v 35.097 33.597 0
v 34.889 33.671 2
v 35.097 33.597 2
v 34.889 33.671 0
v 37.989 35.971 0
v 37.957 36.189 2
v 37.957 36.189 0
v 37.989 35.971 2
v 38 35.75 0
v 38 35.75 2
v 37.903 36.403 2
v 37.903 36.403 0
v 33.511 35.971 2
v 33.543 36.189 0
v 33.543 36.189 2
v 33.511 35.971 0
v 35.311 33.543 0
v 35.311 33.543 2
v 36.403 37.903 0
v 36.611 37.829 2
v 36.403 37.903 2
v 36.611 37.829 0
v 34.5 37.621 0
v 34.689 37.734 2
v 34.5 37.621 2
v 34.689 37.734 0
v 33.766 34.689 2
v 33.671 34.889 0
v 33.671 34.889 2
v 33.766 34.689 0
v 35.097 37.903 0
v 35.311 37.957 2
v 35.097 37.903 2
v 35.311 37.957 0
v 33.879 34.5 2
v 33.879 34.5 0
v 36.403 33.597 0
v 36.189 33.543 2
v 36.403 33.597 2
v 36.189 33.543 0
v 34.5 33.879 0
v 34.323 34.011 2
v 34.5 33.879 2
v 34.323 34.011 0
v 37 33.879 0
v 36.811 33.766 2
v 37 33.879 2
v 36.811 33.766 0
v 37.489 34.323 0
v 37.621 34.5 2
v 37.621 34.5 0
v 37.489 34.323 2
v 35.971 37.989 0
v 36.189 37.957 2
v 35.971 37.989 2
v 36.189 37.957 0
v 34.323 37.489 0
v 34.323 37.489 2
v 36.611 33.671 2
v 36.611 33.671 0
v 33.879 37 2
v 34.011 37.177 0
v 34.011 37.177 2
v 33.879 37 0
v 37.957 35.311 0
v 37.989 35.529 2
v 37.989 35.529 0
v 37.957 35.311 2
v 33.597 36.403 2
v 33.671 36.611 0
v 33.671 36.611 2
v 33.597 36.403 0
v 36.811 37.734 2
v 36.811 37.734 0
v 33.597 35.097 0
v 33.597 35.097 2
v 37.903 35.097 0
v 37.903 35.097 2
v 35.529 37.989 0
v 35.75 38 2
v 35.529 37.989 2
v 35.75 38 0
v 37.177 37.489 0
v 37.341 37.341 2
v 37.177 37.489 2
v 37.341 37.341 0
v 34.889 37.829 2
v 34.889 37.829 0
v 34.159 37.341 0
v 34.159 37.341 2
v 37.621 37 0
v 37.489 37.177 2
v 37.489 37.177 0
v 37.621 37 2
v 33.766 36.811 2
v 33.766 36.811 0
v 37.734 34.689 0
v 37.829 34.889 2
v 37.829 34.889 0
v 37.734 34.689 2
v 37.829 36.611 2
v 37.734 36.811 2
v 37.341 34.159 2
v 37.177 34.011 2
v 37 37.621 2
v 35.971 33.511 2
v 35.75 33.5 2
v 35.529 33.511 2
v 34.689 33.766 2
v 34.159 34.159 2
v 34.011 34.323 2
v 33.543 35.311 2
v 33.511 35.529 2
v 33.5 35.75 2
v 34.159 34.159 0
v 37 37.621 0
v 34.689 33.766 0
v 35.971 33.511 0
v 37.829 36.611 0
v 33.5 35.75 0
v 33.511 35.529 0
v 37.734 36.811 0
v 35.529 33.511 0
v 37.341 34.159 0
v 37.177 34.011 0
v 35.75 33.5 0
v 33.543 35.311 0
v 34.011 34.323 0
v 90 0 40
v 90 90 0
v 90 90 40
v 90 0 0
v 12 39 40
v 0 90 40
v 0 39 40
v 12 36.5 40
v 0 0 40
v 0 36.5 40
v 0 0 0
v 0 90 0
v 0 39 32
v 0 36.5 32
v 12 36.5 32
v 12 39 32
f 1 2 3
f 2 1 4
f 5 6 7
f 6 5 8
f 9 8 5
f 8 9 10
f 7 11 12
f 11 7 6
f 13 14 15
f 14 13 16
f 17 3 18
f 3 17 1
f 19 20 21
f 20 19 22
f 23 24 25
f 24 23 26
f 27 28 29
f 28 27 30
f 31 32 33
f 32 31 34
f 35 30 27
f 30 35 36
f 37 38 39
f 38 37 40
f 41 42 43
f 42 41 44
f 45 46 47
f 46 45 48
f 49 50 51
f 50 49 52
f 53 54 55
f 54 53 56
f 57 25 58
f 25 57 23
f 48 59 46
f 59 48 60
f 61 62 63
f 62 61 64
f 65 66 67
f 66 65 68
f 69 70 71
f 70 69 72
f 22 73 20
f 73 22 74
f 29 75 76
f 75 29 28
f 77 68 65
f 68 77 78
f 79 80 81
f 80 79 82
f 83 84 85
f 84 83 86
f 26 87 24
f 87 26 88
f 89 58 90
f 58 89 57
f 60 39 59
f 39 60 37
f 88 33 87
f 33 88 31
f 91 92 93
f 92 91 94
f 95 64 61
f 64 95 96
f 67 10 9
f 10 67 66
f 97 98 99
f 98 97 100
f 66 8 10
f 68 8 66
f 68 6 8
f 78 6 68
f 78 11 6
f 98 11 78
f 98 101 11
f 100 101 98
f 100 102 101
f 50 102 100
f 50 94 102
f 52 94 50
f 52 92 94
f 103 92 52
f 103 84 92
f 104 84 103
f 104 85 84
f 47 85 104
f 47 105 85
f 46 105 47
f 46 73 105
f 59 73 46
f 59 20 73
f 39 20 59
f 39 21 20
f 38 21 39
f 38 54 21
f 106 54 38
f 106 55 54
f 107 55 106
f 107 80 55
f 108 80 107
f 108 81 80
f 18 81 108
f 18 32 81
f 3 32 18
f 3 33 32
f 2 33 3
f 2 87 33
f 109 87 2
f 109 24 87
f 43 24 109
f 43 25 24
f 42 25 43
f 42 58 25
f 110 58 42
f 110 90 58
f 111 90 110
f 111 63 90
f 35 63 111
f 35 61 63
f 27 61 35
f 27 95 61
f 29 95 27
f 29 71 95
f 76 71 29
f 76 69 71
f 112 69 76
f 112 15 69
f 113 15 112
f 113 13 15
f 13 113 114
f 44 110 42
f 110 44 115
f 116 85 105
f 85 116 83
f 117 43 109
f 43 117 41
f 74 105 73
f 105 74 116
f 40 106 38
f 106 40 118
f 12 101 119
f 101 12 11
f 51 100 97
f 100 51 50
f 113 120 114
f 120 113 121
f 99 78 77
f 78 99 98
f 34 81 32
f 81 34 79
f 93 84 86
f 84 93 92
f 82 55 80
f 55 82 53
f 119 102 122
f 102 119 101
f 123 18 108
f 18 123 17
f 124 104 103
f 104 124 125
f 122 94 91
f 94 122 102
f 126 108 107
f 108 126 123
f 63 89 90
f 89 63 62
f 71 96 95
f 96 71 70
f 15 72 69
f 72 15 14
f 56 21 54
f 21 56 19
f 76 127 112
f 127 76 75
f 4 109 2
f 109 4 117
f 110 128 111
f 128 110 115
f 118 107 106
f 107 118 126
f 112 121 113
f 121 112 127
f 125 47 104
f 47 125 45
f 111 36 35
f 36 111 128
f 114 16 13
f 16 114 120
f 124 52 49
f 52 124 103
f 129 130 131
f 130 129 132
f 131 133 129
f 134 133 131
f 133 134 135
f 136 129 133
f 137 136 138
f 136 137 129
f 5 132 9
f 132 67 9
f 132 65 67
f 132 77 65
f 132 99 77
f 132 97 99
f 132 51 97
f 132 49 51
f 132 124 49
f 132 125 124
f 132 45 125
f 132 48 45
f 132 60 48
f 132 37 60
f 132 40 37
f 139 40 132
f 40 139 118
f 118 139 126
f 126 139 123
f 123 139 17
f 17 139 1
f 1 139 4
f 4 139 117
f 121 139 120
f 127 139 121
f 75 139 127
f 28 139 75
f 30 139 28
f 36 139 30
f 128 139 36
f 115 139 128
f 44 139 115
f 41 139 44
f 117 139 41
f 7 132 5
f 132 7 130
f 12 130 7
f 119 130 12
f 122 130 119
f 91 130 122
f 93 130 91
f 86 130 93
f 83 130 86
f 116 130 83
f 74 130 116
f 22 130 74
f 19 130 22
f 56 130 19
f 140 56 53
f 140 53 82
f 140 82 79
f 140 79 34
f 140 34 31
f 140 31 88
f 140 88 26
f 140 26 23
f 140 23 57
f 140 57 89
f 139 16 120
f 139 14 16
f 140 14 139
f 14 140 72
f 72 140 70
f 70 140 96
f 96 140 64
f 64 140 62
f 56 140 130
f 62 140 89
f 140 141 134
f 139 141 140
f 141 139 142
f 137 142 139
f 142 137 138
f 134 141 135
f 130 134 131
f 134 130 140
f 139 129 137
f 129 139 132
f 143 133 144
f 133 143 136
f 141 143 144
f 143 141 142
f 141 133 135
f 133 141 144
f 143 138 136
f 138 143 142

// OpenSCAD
// DIY Magnetic Stirrer Housing for 80mm PC Fan
// Print Orientation: Upside down. Top plate on bed (Z=0), walls rise to Z=40.

// --- Dimensions ---
// Outer size of the box (X, Y)
W = 90;
H = 90;

// Wall height (above the top plate)
// Spec: Walls rise to Z=40. Top plate is 2mm thick.
// Wall height = 40 - 2 = 38 mm.
D_WALL_HEIGHT = 38;

// Wall thickness
T_WALL = 2.5;

// Top plate thickness
T_TOP = 2;

// Total height of the part (Top plate + Walls)
Z_MAX = T_TOP + D_WALL_HEIGHT; // Should be 40

// Fan mounting hole pattern
// 71.5 mm square pattern centred on the plate
PATTERN_SIZE = 71.5;
// Hole diameter for M4 screws
D_HOLE = 4.5;

// Cable notch dimensions
NOTCH_W = 12;
NOTCH_Y = (H - NOTCH_W) / 2; // Center Y position
NOTCH_DEPTH = 8; // Depth from open edge (Z = 32 to 40)

// --- Configuration ---
$fn = 128; // High resolution for smooth curves and accurate holes

// --- Main Body Construction ---
difference() {
    // 1. The Main Block
    // Outer dimensions: W x H x Z_MAX
    cube([W, H, Z_MAX], center = false);
    
    // 2. Screw Holes
    // Pattern: 71.5mm square centered on the plate.
    // The plate is at Z=0 to Z=2.
    // We cut through the top plate only.
    
    for (i = [-1, 1]) {
        for (j = [-1, 1]) {
            // Calculate position based on pattern size
            x_pos = (PATTERN_SIZE / 2) * i;
            y_pos = (PATTERN_SIZE / 2) * j;
            
            // Cylinder cutter
            // Extend 0.1mm past the top plate (Z=2) to ensure full cut
            translate([x_pos, y_pos, -0.1]) 
                cylinder(h = T_TOP + 0.1, d = D_HOLE, $fn = 64);
        }
    }
    
    // 3. Cable Notch
    // Location: One wall. Let's choose the front wall (Y = H/2 - T_WALL).
    // Dimensions: 12mm wide, centered along the wall.
    // Depth: 8mm down from the open edge.
    // Open edge is at Z = Z_MAX. So notch goes from Z = Z_MAX - 8 to Z = Z_MAX.
    
    // Wall position (Front wall)
    wall_y = H/2 - T_WALL;
    
    // Notch geometry
    notch_y_center = NOTCH_W / 2;
    
    // Create the notch cutter
    // It needs to be tall enough to cut through the wall thickness
    translate([0, wall_y - notch_y_center, Z_MAX - NOTCH_DEPTH])
        cube([NOTCH_W, T_WALL, NOTCH_DEPTH]);
}
